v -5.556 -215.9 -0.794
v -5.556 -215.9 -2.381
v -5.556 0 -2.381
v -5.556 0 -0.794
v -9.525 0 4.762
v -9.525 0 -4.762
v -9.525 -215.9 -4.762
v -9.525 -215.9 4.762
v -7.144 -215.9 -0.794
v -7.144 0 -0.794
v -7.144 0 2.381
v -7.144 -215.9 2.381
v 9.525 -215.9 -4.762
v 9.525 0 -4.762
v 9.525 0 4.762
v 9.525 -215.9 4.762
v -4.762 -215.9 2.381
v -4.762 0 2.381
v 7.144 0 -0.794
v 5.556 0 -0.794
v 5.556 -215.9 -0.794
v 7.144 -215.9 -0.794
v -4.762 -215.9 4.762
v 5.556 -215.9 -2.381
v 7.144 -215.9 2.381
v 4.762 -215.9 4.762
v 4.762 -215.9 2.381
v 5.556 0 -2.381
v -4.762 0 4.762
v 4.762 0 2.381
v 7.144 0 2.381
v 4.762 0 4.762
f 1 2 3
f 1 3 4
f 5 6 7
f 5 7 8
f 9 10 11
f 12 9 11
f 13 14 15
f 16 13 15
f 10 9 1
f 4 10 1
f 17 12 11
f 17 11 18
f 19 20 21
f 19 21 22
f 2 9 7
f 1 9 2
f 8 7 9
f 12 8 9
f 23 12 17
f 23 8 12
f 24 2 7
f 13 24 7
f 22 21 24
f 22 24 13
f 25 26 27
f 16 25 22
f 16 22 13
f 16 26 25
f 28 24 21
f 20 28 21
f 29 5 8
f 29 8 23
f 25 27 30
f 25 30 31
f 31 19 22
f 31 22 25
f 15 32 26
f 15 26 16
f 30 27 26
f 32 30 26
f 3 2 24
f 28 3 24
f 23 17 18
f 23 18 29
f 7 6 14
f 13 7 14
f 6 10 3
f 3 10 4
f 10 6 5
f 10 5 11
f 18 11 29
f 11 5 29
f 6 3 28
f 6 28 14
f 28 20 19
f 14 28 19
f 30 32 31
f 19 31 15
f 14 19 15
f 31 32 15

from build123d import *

# Parameters (mm, degrees)
SKETCH_W        = 19.05
SKETCH_H        = 9.525
PAD_DEPTH       = 215.9
SKETCH001_W     = 9.525
SKETCH001_H     = 2.38125
POCKET_DEPTH    = 215.901
SKETCH002_W     = 14.2875
SKETCH002_H     = 3.175
POCKET001_DEPTH = 215.901
SKETCH003_W     = 11.1125
SKETCH003_H     = 1.5875
POCKET002_DEPTH = 215.901


with BuildPart() as part:
    # Sketch → Pad (new body)
    with BuildSketch(Plane.XZ):
        Rectangle(SKETCH_W, SKETCH_H)
    extrude(amount=PAD_DEPTH)

    # Sketch001 (on Face6 of Pad) → Pocket (cut, through all)
    with BuildSketch(Plane.XZ.offset(215.9)):
        with Locations((0, 3.571875)):
            Rectangle(SKETCH001_W, SKETCH001_H)
    extrude(amount=-POCKET_DEPTH, mode=Mode.SUBTRACT)

    # Sketch002 (on Face5 of Pocket) → Pocket001 (cut, through all)
    with BuildSketch(Plane.XZ.offset(215.9)):
        with Locations((0, 0.79375)):
            Rectangle(SKETCH002_W, SKETCH002_H)
    extrude(amount=-POCKET001_DEPTH, mode=Mode.SUBTRACT)

    # Sketch003 (on Face5 of Pocket001) → Pocket002 (cut, through all)
    with BuildSketch(Plane.XZ.offset(215.9)):
        with Locations((0, -1.5875)):
            Rectangle(SKETCH003_W, SKETCH003_H)
    extrude(amount=-POCKET002_DEPTH, mode=Mode.SUBTRACT)


solid = part.part
